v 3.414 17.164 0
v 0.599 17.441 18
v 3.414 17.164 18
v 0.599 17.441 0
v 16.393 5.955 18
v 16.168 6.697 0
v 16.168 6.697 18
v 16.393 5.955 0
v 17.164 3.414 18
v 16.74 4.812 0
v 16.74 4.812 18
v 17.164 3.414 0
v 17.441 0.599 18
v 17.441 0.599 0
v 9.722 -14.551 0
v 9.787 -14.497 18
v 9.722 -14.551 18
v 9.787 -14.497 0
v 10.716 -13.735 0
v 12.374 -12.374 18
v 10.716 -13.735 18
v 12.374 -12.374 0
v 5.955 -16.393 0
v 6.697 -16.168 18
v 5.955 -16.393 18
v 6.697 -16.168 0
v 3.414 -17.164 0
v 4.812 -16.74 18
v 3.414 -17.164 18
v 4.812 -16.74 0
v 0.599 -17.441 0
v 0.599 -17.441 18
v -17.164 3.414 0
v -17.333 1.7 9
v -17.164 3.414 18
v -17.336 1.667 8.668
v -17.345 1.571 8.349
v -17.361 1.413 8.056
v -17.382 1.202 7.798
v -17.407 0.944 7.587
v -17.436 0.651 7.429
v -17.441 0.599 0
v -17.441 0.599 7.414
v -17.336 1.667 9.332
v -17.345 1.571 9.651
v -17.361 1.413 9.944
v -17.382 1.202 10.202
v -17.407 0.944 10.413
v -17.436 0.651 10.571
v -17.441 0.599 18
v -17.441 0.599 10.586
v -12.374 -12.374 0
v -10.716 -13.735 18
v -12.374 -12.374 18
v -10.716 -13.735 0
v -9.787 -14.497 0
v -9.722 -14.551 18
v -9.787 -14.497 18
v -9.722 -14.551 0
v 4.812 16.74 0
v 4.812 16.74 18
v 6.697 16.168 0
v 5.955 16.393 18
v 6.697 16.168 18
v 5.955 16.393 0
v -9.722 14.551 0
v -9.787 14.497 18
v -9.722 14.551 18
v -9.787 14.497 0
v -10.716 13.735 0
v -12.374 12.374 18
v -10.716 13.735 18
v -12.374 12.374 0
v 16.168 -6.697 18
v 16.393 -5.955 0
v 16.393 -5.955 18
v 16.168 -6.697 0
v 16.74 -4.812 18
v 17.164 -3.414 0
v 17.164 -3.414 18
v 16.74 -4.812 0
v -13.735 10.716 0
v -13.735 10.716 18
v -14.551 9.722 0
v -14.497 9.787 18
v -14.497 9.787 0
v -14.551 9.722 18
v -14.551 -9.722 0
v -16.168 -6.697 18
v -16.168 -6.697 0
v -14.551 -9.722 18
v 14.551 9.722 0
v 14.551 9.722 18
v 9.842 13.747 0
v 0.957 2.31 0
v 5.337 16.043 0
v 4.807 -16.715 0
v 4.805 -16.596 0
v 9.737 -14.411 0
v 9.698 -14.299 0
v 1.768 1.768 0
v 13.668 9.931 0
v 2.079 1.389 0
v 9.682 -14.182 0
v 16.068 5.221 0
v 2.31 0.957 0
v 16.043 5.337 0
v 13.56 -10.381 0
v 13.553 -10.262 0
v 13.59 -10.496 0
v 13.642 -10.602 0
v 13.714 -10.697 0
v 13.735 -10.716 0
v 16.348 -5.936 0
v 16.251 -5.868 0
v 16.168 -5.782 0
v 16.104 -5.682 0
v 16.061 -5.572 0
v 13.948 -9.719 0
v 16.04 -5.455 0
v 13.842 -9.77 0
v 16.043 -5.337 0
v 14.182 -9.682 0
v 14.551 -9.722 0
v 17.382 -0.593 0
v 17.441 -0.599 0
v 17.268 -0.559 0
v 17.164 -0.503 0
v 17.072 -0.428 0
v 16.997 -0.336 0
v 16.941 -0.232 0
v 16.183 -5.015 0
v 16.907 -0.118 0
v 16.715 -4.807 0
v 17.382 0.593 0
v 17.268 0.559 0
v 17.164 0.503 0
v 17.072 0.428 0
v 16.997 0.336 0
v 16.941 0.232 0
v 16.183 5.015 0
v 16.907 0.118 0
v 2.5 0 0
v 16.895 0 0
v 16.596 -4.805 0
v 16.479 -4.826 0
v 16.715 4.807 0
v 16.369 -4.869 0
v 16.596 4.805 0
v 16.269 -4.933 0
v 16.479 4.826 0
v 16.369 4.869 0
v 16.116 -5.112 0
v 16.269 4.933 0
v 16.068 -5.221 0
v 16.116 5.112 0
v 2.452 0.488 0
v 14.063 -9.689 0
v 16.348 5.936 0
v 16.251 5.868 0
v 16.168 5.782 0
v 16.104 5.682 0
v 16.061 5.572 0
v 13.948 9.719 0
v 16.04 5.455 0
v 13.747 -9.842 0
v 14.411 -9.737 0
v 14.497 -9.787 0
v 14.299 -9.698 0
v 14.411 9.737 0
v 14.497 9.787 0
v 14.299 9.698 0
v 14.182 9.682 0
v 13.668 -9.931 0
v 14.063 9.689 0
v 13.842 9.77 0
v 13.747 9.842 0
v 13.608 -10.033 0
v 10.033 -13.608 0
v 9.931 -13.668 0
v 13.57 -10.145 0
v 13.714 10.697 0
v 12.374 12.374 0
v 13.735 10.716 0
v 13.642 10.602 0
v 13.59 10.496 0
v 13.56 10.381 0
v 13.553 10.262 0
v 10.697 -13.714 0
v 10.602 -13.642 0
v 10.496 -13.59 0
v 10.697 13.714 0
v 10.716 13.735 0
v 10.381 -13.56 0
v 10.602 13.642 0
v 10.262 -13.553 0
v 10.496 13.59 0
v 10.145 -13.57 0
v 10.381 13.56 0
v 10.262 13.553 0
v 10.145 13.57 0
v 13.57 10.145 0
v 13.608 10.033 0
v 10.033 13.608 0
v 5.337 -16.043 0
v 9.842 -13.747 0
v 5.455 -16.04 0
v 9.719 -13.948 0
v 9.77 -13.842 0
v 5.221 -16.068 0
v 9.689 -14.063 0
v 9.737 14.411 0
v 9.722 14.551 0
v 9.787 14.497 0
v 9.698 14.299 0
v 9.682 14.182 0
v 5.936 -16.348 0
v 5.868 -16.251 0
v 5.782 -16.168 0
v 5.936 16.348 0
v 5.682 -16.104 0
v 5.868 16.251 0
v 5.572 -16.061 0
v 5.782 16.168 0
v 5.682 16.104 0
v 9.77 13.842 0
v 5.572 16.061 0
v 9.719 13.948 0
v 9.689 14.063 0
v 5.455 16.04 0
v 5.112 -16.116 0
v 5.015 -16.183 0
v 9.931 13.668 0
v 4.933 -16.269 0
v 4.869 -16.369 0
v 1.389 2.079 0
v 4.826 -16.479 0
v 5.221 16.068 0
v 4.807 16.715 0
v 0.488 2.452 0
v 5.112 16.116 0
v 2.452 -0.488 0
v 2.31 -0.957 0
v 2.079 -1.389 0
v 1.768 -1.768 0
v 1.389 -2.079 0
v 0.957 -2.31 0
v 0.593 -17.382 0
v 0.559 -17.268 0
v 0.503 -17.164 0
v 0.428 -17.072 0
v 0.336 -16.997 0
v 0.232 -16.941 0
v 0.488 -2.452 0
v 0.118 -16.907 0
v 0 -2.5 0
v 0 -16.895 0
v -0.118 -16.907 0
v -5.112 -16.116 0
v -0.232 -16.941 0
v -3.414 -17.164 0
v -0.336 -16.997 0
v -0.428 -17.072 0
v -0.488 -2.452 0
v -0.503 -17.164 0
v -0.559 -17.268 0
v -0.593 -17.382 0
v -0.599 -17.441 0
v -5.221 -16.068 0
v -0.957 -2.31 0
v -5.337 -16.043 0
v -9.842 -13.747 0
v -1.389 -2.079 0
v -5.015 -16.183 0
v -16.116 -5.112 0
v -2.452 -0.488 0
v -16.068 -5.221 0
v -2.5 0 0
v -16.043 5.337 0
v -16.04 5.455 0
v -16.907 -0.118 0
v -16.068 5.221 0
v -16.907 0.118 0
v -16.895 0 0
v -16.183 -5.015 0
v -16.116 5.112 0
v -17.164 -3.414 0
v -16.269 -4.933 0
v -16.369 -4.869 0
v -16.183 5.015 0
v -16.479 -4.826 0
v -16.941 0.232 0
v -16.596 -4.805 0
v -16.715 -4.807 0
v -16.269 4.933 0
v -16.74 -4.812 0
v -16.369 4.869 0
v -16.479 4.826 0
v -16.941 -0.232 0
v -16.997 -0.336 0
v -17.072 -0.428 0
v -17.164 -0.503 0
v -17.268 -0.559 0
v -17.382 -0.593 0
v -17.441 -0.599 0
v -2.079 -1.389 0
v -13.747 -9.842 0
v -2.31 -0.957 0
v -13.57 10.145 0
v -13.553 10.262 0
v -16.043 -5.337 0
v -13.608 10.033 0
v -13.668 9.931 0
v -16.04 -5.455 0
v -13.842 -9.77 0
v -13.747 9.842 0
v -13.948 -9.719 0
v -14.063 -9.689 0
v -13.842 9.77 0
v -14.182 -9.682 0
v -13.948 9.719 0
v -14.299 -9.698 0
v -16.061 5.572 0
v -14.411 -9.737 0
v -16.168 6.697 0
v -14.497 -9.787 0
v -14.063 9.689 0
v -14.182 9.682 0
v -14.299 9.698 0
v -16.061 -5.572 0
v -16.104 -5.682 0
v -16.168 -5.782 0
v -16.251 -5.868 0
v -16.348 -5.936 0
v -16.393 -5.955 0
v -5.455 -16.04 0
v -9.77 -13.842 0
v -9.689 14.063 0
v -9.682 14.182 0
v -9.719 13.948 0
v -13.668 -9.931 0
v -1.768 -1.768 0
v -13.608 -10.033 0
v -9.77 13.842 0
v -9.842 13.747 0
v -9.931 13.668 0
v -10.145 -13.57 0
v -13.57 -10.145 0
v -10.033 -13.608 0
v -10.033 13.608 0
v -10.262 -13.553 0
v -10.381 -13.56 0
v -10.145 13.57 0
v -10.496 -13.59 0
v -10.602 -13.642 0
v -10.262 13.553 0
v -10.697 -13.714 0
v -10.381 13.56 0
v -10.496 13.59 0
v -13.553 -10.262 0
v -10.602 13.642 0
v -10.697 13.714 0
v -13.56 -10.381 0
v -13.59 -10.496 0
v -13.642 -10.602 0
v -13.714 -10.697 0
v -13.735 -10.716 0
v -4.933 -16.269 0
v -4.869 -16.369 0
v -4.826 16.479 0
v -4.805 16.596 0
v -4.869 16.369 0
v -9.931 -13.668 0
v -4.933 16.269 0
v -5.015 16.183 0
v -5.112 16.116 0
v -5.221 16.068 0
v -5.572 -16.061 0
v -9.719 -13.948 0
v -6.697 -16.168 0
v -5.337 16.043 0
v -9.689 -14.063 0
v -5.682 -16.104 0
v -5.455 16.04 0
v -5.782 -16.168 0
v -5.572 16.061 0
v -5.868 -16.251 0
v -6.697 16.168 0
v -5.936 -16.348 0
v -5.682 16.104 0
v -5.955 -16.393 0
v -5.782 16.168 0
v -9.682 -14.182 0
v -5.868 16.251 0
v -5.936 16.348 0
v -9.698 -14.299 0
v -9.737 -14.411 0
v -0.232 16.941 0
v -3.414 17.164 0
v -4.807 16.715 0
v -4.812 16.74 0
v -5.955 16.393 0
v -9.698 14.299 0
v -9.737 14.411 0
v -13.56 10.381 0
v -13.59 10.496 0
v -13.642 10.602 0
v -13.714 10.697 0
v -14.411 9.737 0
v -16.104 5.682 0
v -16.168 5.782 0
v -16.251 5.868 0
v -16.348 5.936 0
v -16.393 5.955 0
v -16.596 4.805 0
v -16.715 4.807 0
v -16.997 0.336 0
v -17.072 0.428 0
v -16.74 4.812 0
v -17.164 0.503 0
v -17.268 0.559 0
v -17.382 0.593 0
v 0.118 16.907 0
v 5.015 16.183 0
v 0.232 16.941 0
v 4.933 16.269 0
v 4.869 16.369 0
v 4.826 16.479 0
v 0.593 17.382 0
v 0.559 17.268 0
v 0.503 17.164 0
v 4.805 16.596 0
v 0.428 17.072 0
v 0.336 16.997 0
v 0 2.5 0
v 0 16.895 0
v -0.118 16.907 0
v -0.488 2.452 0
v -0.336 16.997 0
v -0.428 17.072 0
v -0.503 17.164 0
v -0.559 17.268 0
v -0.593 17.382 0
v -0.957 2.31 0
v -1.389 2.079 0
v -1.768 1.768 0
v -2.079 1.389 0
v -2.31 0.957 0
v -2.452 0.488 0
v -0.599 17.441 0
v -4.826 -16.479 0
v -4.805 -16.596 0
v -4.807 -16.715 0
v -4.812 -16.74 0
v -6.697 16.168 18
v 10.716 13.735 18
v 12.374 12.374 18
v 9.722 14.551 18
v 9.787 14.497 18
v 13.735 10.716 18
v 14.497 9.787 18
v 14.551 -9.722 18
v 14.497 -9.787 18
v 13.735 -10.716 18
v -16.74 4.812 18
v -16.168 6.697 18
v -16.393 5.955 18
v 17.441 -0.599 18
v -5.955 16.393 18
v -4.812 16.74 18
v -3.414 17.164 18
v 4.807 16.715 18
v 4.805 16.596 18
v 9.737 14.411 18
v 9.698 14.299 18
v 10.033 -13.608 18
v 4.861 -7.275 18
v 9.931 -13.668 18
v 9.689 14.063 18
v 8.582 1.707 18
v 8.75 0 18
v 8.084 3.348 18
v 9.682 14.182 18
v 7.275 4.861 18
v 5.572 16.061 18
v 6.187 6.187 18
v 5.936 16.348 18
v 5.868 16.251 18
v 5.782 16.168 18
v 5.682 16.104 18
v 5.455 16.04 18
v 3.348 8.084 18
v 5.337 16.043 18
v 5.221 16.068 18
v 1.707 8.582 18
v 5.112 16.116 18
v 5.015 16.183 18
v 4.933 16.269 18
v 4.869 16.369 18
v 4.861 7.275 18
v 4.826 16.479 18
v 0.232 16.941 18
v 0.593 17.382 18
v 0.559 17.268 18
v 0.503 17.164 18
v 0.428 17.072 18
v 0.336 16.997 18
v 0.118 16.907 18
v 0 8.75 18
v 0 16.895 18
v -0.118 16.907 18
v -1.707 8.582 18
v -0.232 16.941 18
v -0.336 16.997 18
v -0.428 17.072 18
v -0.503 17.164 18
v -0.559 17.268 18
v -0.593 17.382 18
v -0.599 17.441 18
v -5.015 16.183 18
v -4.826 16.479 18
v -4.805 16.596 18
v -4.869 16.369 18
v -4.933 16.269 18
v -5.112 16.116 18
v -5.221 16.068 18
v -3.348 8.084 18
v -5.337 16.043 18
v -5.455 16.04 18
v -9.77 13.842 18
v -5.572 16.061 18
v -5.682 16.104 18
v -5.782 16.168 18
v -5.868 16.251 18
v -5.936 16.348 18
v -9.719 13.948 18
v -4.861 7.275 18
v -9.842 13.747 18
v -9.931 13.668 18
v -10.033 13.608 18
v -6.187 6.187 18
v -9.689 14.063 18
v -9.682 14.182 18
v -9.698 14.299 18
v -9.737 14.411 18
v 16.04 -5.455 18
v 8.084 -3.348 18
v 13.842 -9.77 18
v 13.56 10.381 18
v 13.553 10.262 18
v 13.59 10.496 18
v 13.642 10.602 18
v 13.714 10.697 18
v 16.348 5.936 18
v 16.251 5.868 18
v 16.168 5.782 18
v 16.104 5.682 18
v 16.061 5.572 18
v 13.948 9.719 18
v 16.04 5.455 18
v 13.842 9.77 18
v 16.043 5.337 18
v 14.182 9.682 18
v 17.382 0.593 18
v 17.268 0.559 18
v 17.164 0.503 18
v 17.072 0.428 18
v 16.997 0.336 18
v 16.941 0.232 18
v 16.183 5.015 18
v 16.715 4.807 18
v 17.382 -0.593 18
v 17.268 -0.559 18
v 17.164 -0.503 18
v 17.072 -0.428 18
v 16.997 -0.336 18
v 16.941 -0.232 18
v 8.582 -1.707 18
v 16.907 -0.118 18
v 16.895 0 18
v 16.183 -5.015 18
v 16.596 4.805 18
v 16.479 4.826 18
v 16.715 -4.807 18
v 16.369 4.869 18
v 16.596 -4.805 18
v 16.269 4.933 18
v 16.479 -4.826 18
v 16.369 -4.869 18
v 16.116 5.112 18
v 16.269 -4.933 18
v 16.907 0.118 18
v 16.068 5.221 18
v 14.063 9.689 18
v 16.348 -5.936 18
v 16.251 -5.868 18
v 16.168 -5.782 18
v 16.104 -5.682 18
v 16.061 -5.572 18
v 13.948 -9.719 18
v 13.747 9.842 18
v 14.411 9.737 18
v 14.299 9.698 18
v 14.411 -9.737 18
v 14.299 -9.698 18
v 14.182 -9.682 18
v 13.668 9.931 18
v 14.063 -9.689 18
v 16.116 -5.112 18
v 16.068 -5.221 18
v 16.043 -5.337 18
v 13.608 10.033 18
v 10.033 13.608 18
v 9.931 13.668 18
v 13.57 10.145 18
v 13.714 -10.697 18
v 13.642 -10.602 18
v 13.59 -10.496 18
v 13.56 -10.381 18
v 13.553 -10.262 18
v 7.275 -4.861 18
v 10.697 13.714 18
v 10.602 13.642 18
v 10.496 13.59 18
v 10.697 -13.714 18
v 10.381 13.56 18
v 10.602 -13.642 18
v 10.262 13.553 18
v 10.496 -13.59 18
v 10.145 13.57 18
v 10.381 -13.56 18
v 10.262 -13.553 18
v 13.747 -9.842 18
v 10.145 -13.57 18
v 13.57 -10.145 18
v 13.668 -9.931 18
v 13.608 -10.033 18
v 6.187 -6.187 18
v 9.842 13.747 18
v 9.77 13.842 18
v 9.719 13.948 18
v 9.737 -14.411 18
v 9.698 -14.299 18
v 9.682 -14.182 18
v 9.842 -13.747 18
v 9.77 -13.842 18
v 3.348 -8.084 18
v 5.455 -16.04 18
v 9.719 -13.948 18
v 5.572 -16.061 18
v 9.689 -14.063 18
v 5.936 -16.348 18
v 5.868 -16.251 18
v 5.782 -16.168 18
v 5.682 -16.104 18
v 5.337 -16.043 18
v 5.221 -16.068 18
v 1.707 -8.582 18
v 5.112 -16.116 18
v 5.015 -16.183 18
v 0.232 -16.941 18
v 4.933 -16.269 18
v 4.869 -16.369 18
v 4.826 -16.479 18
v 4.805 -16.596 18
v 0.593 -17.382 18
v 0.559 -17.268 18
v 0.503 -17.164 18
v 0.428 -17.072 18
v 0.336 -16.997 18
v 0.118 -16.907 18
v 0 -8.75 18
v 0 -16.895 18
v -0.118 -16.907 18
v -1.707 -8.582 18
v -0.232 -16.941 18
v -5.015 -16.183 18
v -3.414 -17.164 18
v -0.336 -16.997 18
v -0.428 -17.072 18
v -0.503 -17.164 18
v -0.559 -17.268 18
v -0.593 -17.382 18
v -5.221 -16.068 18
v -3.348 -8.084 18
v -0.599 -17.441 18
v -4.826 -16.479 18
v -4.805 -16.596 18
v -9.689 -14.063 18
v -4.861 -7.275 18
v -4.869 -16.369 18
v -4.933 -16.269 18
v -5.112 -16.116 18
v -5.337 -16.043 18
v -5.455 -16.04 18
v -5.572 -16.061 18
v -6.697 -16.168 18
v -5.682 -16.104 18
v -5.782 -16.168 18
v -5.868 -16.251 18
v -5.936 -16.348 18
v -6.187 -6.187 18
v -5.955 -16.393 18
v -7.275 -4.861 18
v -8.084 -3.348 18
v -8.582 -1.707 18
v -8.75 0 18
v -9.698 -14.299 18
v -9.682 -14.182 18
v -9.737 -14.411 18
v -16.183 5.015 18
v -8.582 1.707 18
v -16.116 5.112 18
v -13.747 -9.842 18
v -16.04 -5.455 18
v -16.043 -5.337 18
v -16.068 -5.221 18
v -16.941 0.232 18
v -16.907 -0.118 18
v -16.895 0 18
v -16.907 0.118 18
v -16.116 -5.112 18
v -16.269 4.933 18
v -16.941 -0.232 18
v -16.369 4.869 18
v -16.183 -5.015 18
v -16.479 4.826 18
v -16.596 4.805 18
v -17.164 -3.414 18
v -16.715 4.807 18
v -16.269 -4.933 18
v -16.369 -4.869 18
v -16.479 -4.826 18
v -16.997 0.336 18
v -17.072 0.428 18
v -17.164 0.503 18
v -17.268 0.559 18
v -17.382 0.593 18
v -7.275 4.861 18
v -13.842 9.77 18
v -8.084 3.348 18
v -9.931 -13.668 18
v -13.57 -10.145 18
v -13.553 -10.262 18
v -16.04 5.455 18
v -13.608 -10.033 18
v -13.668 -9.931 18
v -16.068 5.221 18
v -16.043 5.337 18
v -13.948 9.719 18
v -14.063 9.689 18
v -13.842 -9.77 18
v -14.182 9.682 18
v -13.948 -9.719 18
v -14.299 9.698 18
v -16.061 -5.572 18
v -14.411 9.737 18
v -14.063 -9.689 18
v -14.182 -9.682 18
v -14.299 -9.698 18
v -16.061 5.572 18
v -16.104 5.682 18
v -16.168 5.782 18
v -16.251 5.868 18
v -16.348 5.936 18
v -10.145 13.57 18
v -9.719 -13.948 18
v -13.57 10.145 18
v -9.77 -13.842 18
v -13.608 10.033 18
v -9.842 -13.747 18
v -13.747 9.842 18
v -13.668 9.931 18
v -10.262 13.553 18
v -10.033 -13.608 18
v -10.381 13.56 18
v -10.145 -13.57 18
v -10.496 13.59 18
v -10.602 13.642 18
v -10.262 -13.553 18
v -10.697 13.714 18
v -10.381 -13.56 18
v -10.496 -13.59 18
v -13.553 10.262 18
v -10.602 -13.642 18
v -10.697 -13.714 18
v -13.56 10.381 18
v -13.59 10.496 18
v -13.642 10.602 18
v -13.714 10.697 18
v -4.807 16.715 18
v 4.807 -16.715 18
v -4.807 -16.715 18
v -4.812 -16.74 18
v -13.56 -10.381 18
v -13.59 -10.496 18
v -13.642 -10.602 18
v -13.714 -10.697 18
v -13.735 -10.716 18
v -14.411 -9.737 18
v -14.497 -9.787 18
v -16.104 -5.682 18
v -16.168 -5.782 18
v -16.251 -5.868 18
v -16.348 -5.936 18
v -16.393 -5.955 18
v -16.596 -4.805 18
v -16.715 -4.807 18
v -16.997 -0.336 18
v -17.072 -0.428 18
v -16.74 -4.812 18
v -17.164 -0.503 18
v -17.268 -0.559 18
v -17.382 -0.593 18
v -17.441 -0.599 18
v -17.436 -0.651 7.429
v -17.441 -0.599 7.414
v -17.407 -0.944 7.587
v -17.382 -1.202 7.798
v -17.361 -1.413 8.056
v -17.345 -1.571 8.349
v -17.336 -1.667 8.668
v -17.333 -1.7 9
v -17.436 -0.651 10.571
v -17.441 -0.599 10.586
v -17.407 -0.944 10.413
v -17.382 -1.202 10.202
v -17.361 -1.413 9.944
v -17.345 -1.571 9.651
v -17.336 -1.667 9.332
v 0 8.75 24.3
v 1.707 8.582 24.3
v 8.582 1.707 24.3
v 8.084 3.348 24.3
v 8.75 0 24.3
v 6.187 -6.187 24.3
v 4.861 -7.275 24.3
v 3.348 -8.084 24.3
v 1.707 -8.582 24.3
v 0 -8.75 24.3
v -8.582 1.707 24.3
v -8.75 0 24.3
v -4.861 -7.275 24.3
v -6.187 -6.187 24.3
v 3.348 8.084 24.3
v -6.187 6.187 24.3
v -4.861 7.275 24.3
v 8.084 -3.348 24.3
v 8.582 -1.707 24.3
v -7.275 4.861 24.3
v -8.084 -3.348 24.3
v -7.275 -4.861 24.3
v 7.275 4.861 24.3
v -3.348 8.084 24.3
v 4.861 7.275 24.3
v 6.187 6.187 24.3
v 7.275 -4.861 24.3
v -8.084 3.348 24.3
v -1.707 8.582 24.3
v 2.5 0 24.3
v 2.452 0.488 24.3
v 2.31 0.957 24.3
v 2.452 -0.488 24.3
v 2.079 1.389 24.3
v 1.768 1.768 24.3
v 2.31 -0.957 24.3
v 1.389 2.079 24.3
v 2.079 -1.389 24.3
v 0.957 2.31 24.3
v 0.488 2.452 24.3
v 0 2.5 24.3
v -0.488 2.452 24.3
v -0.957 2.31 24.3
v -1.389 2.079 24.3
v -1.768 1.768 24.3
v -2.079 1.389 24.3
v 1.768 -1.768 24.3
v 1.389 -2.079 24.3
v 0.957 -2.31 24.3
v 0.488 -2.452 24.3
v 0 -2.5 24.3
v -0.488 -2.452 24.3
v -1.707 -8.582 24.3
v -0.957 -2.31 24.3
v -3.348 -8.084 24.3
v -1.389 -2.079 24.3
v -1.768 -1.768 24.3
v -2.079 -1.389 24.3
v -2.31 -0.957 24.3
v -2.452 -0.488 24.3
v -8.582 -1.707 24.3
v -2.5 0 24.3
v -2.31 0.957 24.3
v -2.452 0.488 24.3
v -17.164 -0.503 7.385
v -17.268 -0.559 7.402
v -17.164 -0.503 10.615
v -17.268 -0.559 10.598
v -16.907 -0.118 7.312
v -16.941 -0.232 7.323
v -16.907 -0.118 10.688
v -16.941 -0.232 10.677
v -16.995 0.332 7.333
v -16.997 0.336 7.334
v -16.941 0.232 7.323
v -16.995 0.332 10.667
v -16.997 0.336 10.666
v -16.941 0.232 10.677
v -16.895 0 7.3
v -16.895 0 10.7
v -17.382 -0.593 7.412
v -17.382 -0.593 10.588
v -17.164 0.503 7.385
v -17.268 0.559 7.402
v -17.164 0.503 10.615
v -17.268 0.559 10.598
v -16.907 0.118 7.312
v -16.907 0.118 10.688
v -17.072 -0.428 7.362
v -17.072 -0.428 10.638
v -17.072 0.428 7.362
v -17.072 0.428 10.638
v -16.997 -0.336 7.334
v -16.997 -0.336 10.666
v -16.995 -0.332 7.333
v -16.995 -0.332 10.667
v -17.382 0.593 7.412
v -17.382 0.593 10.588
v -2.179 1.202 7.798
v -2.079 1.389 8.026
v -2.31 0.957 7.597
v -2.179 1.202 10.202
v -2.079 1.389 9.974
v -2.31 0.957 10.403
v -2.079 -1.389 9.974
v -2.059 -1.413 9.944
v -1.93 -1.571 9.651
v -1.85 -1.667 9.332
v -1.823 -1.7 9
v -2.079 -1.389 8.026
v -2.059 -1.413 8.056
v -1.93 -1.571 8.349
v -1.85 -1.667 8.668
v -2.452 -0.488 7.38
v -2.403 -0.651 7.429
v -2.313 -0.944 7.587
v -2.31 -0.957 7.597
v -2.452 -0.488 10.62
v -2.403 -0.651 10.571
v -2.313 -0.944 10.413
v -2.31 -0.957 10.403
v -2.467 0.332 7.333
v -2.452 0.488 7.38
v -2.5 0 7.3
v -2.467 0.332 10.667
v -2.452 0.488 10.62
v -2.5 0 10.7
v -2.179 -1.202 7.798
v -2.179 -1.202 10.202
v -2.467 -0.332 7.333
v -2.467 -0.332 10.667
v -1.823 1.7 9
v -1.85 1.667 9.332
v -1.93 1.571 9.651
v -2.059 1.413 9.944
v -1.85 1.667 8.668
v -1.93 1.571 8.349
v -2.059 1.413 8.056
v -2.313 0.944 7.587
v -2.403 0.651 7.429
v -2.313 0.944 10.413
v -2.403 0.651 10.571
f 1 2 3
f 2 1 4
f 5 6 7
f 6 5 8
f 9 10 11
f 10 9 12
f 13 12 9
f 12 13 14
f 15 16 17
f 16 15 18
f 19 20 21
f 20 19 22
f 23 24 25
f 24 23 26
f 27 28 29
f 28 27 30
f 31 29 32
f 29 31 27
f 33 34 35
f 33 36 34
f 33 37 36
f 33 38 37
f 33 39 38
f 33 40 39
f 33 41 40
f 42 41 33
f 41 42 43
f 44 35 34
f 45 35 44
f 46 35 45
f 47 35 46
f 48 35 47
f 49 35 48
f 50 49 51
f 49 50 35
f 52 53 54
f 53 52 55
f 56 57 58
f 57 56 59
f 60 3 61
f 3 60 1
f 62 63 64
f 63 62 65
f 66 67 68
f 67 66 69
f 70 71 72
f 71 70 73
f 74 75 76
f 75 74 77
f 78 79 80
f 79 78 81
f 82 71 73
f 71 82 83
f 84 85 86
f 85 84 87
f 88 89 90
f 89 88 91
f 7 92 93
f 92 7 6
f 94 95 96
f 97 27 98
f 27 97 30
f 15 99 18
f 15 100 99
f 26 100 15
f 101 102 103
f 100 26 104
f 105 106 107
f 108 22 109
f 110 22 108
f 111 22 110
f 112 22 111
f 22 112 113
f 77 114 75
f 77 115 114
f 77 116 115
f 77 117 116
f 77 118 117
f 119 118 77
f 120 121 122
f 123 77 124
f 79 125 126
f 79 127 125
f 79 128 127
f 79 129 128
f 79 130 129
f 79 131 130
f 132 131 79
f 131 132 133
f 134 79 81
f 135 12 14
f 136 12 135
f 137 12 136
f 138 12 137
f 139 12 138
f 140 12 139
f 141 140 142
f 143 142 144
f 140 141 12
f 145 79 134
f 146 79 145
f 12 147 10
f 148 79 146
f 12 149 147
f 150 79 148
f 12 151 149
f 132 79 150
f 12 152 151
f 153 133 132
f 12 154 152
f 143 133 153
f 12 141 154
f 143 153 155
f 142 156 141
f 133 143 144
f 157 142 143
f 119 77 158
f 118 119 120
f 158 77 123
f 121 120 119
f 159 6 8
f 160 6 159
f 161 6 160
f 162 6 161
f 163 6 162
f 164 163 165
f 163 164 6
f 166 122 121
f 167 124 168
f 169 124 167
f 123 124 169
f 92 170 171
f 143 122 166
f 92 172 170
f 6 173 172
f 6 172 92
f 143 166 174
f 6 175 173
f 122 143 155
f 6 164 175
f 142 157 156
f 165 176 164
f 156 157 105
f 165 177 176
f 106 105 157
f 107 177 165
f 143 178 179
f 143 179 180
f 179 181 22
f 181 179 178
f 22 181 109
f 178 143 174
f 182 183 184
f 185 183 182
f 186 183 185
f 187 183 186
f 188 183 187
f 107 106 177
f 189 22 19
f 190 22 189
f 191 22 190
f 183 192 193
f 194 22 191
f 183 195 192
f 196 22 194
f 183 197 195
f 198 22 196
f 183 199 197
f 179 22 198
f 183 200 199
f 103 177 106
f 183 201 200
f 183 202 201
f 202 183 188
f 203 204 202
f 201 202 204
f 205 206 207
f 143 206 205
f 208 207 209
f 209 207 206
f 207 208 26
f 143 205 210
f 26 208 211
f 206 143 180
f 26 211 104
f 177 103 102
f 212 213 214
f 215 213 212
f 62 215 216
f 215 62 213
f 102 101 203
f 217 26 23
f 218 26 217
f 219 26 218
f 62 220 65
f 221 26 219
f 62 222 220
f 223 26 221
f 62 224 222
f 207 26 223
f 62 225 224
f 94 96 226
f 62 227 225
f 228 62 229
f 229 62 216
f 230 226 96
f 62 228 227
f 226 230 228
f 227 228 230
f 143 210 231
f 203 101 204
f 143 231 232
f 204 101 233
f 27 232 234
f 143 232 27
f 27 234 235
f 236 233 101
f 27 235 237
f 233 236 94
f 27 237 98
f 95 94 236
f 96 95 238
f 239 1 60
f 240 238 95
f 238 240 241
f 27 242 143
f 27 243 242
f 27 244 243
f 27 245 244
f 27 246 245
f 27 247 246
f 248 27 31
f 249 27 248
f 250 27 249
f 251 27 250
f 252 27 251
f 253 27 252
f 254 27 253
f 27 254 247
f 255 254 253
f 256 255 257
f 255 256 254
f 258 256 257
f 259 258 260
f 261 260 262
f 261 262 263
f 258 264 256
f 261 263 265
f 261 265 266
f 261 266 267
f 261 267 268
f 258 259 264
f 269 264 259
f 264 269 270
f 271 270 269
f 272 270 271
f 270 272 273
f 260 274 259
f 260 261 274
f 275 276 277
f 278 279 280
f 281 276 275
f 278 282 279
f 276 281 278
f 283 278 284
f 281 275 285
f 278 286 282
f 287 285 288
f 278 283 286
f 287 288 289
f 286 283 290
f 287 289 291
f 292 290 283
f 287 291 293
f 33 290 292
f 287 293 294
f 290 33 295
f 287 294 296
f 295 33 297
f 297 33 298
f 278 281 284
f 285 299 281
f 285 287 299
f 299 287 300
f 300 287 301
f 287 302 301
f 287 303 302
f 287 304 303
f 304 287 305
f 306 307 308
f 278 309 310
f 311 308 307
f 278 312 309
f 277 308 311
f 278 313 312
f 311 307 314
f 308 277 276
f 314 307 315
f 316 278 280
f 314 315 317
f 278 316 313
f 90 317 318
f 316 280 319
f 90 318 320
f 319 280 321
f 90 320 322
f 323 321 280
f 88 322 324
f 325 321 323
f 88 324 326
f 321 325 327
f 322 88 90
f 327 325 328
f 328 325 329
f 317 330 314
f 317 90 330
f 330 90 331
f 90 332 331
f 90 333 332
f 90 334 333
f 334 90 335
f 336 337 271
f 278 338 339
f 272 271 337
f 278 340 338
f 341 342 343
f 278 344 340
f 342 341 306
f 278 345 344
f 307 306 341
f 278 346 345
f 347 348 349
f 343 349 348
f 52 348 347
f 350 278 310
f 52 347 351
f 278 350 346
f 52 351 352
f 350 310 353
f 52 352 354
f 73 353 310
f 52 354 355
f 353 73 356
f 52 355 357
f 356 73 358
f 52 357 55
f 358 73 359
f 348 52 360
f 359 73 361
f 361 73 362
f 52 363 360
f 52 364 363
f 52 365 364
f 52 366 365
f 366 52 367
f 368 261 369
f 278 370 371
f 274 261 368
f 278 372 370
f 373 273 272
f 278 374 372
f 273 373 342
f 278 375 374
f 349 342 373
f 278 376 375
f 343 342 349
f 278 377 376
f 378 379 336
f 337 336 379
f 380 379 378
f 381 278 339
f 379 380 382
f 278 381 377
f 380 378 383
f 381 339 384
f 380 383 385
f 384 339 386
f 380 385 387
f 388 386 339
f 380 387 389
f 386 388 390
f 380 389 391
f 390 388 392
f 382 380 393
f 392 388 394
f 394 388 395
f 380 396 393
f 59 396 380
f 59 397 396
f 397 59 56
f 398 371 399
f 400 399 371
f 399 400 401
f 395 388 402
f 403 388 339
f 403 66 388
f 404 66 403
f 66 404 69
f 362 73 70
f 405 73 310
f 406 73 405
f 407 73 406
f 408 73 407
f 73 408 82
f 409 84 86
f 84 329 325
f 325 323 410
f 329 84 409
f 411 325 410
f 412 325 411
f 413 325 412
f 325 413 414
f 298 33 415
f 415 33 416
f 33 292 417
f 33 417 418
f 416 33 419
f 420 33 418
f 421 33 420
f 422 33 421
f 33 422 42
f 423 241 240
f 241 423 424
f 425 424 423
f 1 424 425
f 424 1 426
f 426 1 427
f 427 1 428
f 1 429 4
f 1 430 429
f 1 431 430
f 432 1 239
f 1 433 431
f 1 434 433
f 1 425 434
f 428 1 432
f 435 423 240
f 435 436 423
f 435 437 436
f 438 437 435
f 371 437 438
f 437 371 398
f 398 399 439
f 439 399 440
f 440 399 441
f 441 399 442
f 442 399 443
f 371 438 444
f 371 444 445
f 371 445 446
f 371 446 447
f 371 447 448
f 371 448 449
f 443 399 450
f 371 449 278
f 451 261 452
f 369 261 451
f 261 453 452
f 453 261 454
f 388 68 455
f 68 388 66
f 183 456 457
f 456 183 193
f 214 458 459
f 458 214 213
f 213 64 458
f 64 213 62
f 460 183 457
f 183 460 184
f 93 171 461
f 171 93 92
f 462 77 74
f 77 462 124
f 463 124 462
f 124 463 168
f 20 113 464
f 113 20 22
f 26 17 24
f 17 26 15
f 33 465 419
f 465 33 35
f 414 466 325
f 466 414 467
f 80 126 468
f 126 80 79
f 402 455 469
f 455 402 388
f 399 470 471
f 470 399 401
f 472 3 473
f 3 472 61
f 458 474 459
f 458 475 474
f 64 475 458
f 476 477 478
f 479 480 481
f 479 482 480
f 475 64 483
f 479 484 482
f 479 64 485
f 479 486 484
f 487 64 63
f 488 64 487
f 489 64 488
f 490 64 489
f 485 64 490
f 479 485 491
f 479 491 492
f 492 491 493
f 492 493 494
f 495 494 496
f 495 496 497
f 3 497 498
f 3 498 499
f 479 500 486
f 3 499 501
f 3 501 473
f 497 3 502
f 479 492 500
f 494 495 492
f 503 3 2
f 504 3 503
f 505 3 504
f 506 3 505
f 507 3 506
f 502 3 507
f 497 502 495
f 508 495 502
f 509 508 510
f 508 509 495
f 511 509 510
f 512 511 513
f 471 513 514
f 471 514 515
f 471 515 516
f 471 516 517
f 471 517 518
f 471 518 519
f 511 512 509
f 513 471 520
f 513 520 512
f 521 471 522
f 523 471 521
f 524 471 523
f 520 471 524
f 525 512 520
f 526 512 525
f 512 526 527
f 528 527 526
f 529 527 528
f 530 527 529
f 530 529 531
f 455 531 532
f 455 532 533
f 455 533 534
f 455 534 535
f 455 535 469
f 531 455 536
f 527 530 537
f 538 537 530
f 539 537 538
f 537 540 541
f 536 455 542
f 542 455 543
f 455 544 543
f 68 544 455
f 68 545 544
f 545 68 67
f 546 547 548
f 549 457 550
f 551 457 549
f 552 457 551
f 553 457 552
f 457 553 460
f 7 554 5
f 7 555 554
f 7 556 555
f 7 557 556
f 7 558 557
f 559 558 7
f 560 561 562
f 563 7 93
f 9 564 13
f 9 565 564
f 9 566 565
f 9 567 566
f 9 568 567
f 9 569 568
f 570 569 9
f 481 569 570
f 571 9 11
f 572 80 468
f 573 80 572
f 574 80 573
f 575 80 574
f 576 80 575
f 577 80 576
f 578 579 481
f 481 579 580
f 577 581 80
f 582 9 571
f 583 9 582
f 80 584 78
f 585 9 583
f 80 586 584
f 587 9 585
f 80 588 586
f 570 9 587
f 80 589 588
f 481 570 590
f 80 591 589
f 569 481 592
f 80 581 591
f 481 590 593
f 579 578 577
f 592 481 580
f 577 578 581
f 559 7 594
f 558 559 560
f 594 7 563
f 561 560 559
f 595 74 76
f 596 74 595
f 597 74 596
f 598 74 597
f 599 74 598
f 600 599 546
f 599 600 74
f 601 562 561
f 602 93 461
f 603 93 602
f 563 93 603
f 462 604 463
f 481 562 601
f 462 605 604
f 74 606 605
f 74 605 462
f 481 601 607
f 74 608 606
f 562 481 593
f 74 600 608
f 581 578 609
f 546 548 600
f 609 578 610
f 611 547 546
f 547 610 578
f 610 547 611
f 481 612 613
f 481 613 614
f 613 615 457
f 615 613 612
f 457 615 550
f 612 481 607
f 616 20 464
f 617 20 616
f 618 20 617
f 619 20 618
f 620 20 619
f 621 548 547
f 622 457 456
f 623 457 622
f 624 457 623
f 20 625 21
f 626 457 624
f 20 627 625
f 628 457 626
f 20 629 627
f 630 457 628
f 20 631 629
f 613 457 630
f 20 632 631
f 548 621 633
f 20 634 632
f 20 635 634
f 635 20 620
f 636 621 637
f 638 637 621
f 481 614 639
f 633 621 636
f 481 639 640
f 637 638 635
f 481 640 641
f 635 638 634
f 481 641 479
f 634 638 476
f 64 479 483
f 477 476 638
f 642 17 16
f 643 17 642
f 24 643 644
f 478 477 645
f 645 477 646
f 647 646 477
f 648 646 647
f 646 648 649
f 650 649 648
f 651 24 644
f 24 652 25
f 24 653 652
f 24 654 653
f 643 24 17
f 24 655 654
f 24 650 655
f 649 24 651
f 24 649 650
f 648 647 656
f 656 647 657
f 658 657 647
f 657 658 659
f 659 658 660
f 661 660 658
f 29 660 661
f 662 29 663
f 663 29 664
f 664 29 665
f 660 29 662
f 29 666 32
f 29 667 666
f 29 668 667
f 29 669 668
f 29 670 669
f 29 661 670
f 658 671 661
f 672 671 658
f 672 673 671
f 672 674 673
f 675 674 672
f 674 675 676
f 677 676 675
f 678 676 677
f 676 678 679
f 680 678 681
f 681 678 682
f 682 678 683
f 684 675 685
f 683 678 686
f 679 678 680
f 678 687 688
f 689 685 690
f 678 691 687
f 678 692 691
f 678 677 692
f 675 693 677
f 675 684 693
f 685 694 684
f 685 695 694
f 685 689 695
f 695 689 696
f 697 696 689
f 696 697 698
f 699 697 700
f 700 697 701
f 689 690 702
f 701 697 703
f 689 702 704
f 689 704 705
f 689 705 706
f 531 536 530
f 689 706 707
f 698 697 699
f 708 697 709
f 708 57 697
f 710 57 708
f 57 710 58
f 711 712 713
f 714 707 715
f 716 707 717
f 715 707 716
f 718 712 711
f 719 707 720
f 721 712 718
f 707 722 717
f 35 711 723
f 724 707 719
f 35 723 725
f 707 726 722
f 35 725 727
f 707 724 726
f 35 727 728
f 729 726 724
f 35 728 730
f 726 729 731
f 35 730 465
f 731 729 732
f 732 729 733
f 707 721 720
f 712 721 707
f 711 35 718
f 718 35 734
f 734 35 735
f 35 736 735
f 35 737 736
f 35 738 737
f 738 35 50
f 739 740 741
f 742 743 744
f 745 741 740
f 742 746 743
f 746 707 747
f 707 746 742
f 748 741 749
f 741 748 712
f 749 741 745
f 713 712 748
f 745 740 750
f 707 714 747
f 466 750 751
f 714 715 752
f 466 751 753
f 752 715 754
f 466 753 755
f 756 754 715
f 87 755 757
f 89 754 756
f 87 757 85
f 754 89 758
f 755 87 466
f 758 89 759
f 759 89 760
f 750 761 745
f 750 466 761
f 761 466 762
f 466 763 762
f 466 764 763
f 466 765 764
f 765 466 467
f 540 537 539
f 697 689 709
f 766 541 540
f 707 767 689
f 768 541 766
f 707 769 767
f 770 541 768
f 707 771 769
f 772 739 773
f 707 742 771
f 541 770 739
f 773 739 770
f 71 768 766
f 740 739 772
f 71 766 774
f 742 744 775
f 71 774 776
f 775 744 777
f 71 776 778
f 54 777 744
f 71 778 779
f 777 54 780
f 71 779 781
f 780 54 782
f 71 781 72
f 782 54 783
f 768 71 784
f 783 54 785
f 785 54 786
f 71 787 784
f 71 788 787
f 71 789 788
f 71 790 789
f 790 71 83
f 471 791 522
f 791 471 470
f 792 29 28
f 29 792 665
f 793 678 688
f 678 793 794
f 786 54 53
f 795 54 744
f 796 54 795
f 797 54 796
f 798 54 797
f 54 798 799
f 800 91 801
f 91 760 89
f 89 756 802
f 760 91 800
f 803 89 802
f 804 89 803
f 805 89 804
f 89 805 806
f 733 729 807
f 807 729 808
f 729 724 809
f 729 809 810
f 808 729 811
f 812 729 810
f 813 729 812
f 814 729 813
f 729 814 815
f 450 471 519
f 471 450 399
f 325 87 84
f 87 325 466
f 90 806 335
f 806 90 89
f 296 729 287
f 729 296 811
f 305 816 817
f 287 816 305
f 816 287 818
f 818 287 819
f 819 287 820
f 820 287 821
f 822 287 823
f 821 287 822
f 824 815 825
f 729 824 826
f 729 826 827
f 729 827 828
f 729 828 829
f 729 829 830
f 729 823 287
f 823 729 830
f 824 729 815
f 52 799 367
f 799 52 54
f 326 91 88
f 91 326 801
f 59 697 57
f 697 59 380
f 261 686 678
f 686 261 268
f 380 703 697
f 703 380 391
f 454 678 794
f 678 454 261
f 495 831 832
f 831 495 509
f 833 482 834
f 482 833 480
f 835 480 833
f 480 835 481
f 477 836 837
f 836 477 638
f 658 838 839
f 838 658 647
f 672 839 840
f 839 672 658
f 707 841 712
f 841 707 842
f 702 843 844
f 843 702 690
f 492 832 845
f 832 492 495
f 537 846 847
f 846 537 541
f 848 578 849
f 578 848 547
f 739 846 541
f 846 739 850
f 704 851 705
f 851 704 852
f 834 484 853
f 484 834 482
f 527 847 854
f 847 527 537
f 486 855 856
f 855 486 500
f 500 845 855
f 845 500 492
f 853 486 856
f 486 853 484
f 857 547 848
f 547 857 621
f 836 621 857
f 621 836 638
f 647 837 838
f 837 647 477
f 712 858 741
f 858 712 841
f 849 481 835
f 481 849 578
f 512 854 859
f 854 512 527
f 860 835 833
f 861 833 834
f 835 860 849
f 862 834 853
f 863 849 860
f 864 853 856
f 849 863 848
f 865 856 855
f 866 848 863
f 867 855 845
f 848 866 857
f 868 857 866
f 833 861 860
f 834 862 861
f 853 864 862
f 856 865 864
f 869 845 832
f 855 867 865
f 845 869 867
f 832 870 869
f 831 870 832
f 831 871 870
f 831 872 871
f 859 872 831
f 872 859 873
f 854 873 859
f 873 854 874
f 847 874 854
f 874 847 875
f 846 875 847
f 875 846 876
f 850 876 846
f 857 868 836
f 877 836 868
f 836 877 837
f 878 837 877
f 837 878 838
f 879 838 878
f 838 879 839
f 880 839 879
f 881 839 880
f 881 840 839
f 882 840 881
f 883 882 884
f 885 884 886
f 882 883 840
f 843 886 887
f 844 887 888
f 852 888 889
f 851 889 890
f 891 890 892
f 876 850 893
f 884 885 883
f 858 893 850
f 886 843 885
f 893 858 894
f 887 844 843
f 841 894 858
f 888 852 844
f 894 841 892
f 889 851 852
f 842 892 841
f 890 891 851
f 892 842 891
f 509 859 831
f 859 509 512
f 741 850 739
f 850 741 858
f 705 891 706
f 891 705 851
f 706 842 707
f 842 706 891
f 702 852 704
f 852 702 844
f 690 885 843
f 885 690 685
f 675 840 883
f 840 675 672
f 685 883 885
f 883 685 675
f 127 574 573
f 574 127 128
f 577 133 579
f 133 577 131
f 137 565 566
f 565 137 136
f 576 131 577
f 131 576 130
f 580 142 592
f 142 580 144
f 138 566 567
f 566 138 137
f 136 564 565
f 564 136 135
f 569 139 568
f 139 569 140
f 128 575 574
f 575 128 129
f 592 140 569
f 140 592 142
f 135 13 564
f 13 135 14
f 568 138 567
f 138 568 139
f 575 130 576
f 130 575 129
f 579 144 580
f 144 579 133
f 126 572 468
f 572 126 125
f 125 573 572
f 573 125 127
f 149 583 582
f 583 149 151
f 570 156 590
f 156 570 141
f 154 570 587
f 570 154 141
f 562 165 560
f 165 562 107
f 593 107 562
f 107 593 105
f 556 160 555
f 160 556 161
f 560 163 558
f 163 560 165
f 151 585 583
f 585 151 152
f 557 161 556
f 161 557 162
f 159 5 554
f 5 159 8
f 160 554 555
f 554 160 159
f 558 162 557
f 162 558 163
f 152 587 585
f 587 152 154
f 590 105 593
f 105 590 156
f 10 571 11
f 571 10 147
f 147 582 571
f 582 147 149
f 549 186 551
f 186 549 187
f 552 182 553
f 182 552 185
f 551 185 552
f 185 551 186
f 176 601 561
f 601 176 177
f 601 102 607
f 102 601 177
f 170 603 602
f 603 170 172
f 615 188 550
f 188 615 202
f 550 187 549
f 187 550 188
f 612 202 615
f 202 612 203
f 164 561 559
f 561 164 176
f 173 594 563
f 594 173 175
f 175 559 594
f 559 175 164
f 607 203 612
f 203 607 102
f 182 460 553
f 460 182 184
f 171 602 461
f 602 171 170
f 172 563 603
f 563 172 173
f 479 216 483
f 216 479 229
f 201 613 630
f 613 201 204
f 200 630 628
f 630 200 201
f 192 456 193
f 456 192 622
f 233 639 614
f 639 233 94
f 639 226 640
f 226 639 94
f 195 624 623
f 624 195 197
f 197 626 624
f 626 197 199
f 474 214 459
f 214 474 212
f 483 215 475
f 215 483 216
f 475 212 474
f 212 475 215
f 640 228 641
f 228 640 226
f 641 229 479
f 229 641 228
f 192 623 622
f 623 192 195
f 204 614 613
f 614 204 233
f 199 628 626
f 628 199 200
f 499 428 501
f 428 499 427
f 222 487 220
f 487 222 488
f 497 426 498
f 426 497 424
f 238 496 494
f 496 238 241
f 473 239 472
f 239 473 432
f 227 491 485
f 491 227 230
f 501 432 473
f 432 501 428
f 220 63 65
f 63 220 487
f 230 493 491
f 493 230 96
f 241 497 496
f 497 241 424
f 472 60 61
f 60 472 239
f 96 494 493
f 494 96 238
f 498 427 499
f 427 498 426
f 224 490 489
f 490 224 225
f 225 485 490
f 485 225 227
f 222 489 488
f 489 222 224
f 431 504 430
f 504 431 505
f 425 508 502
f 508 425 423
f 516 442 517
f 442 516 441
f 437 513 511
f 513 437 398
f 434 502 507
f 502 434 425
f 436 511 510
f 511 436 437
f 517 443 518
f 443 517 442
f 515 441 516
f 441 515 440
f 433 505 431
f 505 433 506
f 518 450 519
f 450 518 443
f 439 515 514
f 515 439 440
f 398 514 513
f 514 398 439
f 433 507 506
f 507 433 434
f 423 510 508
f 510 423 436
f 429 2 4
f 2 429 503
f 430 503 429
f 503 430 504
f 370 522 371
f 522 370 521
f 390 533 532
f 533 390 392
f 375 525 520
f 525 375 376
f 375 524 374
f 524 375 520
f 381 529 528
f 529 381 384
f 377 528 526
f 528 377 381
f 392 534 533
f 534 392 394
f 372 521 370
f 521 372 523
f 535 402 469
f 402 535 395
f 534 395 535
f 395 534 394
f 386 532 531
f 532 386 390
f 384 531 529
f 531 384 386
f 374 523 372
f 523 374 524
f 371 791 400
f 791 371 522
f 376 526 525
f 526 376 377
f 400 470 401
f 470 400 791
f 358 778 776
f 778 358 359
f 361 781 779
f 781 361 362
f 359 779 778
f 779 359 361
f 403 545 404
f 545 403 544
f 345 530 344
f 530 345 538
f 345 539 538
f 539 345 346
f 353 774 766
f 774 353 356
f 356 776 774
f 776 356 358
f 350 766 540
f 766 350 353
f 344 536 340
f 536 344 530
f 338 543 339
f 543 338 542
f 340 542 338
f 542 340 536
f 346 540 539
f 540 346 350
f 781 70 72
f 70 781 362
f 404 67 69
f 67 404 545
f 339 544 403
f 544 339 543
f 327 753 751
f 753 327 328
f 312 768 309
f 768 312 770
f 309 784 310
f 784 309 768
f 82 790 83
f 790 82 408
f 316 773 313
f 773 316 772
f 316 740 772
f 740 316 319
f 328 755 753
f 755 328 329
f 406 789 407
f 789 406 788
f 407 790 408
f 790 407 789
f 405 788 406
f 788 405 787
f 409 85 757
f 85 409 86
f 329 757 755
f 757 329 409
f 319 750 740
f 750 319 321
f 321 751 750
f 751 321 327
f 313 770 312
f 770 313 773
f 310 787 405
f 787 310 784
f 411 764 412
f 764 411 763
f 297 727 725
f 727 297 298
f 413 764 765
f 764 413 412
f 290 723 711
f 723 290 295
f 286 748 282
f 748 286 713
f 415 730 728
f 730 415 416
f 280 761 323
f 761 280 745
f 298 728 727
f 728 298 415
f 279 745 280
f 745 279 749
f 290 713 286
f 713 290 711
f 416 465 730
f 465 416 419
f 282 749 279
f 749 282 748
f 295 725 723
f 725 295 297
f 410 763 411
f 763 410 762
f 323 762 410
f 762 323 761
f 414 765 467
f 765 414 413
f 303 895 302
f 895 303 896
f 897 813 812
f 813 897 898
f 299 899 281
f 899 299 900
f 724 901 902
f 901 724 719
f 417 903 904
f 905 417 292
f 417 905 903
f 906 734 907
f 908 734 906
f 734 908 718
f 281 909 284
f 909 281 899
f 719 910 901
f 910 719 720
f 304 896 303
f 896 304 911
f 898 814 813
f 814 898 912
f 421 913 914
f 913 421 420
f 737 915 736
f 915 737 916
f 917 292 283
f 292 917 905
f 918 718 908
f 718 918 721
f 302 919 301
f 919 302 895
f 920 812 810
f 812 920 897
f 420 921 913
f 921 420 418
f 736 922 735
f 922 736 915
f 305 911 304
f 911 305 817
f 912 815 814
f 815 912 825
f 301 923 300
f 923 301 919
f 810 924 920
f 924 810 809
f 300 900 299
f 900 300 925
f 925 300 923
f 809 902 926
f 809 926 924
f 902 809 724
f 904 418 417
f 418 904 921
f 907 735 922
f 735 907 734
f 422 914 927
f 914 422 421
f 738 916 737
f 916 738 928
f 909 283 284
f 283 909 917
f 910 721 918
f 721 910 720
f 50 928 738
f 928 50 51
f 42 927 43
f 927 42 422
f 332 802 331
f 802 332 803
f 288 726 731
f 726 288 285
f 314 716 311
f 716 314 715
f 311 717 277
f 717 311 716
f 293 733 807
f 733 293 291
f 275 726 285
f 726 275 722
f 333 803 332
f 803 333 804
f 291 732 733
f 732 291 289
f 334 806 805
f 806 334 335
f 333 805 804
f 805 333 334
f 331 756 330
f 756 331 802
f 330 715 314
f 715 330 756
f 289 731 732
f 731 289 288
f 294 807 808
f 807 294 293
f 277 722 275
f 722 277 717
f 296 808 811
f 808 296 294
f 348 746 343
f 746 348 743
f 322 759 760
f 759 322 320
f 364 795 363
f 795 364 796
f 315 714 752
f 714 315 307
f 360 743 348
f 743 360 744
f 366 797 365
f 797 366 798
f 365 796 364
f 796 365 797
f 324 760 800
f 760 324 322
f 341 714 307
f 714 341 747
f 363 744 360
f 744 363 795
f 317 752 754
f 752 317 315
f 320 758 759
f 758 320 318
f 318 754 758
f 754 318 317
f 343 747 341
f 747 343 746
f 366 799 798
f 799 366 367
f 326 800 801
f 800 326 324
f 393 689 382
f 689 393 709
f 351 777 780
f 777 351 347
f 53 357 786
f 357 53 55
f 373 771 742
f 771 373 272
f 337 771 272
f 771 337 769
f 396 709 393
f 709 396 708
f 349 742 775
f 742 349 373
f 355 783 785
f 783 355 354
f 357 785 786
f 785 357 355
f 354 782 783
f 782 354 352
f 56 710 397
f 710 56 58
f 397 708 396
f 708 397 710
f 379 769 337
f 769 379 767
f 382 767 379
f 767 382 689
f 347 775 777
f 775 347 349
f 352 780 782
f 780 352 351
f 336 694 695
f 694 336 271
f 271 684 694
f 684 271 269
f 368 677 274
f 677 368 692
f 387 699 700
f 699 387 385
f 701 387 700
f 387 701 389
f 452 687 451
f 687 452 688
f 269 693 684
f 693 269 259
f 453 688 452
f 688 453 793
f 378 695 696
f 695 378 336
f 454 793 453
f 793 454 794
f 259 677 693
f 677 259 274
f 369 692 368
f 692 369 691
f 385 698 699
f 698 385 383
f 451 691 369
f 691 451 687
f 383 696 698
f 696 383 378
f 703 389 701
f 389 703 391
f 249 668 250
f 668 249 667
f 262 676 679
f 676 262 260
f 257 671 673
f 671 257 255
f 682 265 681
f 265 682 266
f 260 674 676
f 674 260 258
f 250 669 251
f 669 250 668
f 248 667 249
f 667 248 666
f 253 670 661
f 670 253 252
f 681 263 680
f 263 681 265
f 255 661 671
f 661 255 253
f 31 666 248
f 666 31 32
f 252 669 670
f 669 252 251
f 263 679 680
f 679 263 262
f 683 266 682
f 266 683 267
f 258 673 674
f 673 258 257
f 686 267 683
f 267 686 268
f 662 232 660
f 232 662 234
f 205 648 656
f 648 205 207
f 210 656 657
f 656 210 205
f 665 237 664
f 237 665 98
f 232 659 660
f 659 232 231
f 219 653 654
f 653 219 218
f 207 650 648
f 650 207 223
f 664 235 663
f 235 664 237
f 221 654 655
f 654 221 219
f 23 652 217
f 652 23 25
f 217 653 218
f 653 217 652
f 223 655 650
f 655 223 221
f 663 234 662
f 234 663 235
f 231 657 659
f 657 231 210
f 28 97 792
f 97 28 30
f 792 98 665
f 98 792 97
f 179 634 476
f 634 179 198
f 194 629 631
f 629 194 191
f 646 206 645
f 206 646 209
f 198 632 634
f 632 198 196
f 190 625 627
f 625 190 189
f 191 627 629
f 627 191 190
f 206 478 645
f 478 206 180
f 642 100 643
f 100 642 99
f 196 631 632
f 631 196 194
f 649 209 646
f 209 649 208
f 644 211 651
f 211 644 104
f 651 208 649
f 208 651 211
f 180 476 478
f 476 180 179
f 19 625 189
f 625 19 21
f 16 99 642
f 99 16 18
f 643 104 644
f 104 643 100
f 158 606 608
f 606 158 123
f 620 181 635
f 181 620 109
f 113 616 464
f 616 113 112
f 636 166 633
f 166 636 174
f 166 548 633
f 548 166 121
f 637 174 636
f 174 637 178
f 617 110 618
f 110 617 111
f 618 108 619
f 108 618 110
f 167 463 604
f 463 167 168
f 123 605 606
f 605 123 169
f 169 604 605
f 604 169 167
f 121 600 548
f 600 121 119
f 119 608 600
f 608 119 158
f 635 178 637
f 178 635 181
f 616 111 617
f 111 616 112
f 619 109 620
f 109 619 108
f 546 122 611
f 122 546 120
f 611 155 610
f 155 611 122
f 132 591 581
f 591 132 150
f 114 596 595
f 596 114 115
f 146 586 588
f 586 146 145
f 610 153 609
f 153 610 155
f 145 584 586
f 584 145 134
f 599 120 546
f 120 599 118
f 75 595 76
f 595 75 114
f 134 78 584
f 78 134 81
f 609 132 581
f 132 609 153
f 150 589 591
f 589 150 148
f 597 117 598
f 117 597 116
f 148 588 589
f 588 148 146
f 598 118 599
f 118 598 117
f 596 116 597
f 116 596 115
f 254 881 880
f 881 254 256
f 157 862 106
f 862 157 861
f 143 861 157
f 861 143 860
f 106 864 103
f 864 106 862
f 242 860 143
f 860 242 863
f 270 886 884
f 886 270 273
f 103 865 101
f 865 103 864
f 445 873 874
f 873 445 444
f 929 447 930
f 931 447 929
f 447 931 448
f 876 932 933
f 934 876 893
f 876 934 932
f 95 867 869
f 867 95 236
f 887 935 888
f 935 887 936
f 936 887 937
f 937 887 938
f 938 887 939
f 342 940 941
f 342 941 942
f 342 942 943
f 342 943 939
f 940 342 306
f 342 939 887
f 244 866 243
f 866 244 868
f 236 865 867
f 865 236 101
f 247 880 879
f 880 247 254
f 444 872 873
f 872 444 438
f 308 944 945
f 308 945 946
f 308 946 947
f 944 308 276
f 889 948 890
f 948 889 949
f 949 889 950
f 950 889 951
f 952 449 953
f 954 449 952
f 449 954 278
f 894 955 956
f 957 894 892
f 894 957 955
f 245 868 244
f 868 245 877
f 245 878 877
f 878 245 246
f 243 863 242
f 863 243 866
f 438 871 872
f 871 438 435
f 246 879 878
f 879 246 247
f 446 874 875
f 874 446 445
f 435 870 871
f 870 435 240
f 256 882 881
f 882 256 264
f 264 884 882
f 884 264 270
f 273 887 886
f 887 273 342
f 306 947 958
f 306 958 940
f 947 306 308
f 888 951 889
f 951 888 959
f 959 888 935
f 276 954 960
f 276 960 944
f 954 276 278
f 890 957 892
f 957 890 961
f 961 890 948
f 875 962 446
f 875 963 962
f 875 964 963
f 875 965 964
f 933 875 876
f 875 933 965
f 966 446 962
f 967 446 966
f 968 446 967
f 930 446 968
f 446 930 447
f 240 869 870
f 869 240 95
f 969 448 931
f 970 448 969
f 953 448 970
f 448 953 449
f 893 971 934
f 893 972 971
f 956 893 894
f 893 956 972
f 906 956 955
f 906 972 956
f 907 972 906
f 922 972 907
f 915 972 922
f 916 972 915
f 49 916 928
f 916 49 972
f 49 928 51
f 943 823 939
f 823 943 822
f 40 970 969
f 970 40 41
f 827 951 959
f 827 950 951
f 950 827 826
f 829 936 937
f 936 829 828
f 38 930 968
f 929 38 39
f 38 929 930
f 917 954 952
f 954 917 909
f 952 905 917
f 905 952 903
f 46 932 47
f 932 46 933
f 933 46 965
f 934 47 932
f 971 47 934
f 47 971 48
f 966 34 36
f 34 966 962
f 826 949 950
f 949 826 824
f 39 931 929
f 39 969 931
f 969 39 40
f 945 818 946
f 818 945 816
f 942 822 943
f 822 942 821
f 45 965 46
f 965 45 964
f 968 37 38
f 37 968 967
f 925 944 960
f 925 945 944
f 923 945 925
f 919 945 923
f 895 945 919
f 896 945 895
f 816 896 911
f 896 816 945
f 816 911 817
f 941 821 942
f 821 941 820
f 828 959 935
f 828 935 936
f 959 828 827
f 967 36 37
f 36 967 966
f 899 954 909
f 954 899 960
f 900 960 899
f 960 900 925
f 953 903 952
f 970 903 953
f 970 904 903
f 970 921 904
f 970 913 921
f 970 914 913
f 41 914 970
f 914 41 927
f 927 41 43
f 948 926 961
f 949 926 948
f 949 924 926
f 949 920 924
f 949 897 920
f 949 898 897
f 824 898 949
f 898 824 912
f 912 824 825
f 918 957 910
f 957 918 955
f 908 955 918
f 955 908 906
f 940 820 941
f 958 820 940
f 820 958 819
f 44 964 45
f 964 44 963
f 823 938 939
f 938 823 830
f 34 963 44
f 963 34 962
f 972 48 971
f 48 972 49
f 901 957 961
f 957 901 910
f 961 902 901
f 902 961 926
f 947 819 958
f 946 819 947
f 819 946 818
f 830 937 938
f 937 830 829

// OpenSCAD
$fn = 32;

// ----------------------------------------------------------------------
// Hand knob: 35 x 35 x 24.3 mm
// ----------------------------------------------------------------------

// --- parameters (mm) ---
knob_d = 35;              // knob diameter
knob_h = 18;              // knob height
bore_d = 5;               // shaft bore
set_d = 3.4;              // set screw tap hole
knurl_d = 1.21;           // knurl groove diameter
knurl_n = 20;             // number of knurl grooves
cap_h = 6.3;              // raised centre cap
cap_d = 17.5;             // centre cap diameter

module body() {
  cylinder(h = knob_h, d = knob_d);
}

module cap() {
  translate([0, 0, knob_h - 1]) cylinder(h = cap_h + 1, d = cap_d);
}

difference() {
  union() {
    body();
    cap();
  }
  translate([0, 0, -1]) cylinder(h = knob_h + cap_h + 2, d = bore_d);
  /* knurl grooves */
  for (i = [0 : knurl_n - 1])
    rotate([0, 0, i * 360 / knurl_n])
      translate([knob_d / 2, 0, -0.5])
        cylinder(h = knob_h + 1, d = knurl_d);
  translate([-knob_d / 2 - 1, 0, knob_h * 0.5]) rotate([0, 90, 0]) cylinder(h = knob_d / 2 + 2, d = set_d);
}
